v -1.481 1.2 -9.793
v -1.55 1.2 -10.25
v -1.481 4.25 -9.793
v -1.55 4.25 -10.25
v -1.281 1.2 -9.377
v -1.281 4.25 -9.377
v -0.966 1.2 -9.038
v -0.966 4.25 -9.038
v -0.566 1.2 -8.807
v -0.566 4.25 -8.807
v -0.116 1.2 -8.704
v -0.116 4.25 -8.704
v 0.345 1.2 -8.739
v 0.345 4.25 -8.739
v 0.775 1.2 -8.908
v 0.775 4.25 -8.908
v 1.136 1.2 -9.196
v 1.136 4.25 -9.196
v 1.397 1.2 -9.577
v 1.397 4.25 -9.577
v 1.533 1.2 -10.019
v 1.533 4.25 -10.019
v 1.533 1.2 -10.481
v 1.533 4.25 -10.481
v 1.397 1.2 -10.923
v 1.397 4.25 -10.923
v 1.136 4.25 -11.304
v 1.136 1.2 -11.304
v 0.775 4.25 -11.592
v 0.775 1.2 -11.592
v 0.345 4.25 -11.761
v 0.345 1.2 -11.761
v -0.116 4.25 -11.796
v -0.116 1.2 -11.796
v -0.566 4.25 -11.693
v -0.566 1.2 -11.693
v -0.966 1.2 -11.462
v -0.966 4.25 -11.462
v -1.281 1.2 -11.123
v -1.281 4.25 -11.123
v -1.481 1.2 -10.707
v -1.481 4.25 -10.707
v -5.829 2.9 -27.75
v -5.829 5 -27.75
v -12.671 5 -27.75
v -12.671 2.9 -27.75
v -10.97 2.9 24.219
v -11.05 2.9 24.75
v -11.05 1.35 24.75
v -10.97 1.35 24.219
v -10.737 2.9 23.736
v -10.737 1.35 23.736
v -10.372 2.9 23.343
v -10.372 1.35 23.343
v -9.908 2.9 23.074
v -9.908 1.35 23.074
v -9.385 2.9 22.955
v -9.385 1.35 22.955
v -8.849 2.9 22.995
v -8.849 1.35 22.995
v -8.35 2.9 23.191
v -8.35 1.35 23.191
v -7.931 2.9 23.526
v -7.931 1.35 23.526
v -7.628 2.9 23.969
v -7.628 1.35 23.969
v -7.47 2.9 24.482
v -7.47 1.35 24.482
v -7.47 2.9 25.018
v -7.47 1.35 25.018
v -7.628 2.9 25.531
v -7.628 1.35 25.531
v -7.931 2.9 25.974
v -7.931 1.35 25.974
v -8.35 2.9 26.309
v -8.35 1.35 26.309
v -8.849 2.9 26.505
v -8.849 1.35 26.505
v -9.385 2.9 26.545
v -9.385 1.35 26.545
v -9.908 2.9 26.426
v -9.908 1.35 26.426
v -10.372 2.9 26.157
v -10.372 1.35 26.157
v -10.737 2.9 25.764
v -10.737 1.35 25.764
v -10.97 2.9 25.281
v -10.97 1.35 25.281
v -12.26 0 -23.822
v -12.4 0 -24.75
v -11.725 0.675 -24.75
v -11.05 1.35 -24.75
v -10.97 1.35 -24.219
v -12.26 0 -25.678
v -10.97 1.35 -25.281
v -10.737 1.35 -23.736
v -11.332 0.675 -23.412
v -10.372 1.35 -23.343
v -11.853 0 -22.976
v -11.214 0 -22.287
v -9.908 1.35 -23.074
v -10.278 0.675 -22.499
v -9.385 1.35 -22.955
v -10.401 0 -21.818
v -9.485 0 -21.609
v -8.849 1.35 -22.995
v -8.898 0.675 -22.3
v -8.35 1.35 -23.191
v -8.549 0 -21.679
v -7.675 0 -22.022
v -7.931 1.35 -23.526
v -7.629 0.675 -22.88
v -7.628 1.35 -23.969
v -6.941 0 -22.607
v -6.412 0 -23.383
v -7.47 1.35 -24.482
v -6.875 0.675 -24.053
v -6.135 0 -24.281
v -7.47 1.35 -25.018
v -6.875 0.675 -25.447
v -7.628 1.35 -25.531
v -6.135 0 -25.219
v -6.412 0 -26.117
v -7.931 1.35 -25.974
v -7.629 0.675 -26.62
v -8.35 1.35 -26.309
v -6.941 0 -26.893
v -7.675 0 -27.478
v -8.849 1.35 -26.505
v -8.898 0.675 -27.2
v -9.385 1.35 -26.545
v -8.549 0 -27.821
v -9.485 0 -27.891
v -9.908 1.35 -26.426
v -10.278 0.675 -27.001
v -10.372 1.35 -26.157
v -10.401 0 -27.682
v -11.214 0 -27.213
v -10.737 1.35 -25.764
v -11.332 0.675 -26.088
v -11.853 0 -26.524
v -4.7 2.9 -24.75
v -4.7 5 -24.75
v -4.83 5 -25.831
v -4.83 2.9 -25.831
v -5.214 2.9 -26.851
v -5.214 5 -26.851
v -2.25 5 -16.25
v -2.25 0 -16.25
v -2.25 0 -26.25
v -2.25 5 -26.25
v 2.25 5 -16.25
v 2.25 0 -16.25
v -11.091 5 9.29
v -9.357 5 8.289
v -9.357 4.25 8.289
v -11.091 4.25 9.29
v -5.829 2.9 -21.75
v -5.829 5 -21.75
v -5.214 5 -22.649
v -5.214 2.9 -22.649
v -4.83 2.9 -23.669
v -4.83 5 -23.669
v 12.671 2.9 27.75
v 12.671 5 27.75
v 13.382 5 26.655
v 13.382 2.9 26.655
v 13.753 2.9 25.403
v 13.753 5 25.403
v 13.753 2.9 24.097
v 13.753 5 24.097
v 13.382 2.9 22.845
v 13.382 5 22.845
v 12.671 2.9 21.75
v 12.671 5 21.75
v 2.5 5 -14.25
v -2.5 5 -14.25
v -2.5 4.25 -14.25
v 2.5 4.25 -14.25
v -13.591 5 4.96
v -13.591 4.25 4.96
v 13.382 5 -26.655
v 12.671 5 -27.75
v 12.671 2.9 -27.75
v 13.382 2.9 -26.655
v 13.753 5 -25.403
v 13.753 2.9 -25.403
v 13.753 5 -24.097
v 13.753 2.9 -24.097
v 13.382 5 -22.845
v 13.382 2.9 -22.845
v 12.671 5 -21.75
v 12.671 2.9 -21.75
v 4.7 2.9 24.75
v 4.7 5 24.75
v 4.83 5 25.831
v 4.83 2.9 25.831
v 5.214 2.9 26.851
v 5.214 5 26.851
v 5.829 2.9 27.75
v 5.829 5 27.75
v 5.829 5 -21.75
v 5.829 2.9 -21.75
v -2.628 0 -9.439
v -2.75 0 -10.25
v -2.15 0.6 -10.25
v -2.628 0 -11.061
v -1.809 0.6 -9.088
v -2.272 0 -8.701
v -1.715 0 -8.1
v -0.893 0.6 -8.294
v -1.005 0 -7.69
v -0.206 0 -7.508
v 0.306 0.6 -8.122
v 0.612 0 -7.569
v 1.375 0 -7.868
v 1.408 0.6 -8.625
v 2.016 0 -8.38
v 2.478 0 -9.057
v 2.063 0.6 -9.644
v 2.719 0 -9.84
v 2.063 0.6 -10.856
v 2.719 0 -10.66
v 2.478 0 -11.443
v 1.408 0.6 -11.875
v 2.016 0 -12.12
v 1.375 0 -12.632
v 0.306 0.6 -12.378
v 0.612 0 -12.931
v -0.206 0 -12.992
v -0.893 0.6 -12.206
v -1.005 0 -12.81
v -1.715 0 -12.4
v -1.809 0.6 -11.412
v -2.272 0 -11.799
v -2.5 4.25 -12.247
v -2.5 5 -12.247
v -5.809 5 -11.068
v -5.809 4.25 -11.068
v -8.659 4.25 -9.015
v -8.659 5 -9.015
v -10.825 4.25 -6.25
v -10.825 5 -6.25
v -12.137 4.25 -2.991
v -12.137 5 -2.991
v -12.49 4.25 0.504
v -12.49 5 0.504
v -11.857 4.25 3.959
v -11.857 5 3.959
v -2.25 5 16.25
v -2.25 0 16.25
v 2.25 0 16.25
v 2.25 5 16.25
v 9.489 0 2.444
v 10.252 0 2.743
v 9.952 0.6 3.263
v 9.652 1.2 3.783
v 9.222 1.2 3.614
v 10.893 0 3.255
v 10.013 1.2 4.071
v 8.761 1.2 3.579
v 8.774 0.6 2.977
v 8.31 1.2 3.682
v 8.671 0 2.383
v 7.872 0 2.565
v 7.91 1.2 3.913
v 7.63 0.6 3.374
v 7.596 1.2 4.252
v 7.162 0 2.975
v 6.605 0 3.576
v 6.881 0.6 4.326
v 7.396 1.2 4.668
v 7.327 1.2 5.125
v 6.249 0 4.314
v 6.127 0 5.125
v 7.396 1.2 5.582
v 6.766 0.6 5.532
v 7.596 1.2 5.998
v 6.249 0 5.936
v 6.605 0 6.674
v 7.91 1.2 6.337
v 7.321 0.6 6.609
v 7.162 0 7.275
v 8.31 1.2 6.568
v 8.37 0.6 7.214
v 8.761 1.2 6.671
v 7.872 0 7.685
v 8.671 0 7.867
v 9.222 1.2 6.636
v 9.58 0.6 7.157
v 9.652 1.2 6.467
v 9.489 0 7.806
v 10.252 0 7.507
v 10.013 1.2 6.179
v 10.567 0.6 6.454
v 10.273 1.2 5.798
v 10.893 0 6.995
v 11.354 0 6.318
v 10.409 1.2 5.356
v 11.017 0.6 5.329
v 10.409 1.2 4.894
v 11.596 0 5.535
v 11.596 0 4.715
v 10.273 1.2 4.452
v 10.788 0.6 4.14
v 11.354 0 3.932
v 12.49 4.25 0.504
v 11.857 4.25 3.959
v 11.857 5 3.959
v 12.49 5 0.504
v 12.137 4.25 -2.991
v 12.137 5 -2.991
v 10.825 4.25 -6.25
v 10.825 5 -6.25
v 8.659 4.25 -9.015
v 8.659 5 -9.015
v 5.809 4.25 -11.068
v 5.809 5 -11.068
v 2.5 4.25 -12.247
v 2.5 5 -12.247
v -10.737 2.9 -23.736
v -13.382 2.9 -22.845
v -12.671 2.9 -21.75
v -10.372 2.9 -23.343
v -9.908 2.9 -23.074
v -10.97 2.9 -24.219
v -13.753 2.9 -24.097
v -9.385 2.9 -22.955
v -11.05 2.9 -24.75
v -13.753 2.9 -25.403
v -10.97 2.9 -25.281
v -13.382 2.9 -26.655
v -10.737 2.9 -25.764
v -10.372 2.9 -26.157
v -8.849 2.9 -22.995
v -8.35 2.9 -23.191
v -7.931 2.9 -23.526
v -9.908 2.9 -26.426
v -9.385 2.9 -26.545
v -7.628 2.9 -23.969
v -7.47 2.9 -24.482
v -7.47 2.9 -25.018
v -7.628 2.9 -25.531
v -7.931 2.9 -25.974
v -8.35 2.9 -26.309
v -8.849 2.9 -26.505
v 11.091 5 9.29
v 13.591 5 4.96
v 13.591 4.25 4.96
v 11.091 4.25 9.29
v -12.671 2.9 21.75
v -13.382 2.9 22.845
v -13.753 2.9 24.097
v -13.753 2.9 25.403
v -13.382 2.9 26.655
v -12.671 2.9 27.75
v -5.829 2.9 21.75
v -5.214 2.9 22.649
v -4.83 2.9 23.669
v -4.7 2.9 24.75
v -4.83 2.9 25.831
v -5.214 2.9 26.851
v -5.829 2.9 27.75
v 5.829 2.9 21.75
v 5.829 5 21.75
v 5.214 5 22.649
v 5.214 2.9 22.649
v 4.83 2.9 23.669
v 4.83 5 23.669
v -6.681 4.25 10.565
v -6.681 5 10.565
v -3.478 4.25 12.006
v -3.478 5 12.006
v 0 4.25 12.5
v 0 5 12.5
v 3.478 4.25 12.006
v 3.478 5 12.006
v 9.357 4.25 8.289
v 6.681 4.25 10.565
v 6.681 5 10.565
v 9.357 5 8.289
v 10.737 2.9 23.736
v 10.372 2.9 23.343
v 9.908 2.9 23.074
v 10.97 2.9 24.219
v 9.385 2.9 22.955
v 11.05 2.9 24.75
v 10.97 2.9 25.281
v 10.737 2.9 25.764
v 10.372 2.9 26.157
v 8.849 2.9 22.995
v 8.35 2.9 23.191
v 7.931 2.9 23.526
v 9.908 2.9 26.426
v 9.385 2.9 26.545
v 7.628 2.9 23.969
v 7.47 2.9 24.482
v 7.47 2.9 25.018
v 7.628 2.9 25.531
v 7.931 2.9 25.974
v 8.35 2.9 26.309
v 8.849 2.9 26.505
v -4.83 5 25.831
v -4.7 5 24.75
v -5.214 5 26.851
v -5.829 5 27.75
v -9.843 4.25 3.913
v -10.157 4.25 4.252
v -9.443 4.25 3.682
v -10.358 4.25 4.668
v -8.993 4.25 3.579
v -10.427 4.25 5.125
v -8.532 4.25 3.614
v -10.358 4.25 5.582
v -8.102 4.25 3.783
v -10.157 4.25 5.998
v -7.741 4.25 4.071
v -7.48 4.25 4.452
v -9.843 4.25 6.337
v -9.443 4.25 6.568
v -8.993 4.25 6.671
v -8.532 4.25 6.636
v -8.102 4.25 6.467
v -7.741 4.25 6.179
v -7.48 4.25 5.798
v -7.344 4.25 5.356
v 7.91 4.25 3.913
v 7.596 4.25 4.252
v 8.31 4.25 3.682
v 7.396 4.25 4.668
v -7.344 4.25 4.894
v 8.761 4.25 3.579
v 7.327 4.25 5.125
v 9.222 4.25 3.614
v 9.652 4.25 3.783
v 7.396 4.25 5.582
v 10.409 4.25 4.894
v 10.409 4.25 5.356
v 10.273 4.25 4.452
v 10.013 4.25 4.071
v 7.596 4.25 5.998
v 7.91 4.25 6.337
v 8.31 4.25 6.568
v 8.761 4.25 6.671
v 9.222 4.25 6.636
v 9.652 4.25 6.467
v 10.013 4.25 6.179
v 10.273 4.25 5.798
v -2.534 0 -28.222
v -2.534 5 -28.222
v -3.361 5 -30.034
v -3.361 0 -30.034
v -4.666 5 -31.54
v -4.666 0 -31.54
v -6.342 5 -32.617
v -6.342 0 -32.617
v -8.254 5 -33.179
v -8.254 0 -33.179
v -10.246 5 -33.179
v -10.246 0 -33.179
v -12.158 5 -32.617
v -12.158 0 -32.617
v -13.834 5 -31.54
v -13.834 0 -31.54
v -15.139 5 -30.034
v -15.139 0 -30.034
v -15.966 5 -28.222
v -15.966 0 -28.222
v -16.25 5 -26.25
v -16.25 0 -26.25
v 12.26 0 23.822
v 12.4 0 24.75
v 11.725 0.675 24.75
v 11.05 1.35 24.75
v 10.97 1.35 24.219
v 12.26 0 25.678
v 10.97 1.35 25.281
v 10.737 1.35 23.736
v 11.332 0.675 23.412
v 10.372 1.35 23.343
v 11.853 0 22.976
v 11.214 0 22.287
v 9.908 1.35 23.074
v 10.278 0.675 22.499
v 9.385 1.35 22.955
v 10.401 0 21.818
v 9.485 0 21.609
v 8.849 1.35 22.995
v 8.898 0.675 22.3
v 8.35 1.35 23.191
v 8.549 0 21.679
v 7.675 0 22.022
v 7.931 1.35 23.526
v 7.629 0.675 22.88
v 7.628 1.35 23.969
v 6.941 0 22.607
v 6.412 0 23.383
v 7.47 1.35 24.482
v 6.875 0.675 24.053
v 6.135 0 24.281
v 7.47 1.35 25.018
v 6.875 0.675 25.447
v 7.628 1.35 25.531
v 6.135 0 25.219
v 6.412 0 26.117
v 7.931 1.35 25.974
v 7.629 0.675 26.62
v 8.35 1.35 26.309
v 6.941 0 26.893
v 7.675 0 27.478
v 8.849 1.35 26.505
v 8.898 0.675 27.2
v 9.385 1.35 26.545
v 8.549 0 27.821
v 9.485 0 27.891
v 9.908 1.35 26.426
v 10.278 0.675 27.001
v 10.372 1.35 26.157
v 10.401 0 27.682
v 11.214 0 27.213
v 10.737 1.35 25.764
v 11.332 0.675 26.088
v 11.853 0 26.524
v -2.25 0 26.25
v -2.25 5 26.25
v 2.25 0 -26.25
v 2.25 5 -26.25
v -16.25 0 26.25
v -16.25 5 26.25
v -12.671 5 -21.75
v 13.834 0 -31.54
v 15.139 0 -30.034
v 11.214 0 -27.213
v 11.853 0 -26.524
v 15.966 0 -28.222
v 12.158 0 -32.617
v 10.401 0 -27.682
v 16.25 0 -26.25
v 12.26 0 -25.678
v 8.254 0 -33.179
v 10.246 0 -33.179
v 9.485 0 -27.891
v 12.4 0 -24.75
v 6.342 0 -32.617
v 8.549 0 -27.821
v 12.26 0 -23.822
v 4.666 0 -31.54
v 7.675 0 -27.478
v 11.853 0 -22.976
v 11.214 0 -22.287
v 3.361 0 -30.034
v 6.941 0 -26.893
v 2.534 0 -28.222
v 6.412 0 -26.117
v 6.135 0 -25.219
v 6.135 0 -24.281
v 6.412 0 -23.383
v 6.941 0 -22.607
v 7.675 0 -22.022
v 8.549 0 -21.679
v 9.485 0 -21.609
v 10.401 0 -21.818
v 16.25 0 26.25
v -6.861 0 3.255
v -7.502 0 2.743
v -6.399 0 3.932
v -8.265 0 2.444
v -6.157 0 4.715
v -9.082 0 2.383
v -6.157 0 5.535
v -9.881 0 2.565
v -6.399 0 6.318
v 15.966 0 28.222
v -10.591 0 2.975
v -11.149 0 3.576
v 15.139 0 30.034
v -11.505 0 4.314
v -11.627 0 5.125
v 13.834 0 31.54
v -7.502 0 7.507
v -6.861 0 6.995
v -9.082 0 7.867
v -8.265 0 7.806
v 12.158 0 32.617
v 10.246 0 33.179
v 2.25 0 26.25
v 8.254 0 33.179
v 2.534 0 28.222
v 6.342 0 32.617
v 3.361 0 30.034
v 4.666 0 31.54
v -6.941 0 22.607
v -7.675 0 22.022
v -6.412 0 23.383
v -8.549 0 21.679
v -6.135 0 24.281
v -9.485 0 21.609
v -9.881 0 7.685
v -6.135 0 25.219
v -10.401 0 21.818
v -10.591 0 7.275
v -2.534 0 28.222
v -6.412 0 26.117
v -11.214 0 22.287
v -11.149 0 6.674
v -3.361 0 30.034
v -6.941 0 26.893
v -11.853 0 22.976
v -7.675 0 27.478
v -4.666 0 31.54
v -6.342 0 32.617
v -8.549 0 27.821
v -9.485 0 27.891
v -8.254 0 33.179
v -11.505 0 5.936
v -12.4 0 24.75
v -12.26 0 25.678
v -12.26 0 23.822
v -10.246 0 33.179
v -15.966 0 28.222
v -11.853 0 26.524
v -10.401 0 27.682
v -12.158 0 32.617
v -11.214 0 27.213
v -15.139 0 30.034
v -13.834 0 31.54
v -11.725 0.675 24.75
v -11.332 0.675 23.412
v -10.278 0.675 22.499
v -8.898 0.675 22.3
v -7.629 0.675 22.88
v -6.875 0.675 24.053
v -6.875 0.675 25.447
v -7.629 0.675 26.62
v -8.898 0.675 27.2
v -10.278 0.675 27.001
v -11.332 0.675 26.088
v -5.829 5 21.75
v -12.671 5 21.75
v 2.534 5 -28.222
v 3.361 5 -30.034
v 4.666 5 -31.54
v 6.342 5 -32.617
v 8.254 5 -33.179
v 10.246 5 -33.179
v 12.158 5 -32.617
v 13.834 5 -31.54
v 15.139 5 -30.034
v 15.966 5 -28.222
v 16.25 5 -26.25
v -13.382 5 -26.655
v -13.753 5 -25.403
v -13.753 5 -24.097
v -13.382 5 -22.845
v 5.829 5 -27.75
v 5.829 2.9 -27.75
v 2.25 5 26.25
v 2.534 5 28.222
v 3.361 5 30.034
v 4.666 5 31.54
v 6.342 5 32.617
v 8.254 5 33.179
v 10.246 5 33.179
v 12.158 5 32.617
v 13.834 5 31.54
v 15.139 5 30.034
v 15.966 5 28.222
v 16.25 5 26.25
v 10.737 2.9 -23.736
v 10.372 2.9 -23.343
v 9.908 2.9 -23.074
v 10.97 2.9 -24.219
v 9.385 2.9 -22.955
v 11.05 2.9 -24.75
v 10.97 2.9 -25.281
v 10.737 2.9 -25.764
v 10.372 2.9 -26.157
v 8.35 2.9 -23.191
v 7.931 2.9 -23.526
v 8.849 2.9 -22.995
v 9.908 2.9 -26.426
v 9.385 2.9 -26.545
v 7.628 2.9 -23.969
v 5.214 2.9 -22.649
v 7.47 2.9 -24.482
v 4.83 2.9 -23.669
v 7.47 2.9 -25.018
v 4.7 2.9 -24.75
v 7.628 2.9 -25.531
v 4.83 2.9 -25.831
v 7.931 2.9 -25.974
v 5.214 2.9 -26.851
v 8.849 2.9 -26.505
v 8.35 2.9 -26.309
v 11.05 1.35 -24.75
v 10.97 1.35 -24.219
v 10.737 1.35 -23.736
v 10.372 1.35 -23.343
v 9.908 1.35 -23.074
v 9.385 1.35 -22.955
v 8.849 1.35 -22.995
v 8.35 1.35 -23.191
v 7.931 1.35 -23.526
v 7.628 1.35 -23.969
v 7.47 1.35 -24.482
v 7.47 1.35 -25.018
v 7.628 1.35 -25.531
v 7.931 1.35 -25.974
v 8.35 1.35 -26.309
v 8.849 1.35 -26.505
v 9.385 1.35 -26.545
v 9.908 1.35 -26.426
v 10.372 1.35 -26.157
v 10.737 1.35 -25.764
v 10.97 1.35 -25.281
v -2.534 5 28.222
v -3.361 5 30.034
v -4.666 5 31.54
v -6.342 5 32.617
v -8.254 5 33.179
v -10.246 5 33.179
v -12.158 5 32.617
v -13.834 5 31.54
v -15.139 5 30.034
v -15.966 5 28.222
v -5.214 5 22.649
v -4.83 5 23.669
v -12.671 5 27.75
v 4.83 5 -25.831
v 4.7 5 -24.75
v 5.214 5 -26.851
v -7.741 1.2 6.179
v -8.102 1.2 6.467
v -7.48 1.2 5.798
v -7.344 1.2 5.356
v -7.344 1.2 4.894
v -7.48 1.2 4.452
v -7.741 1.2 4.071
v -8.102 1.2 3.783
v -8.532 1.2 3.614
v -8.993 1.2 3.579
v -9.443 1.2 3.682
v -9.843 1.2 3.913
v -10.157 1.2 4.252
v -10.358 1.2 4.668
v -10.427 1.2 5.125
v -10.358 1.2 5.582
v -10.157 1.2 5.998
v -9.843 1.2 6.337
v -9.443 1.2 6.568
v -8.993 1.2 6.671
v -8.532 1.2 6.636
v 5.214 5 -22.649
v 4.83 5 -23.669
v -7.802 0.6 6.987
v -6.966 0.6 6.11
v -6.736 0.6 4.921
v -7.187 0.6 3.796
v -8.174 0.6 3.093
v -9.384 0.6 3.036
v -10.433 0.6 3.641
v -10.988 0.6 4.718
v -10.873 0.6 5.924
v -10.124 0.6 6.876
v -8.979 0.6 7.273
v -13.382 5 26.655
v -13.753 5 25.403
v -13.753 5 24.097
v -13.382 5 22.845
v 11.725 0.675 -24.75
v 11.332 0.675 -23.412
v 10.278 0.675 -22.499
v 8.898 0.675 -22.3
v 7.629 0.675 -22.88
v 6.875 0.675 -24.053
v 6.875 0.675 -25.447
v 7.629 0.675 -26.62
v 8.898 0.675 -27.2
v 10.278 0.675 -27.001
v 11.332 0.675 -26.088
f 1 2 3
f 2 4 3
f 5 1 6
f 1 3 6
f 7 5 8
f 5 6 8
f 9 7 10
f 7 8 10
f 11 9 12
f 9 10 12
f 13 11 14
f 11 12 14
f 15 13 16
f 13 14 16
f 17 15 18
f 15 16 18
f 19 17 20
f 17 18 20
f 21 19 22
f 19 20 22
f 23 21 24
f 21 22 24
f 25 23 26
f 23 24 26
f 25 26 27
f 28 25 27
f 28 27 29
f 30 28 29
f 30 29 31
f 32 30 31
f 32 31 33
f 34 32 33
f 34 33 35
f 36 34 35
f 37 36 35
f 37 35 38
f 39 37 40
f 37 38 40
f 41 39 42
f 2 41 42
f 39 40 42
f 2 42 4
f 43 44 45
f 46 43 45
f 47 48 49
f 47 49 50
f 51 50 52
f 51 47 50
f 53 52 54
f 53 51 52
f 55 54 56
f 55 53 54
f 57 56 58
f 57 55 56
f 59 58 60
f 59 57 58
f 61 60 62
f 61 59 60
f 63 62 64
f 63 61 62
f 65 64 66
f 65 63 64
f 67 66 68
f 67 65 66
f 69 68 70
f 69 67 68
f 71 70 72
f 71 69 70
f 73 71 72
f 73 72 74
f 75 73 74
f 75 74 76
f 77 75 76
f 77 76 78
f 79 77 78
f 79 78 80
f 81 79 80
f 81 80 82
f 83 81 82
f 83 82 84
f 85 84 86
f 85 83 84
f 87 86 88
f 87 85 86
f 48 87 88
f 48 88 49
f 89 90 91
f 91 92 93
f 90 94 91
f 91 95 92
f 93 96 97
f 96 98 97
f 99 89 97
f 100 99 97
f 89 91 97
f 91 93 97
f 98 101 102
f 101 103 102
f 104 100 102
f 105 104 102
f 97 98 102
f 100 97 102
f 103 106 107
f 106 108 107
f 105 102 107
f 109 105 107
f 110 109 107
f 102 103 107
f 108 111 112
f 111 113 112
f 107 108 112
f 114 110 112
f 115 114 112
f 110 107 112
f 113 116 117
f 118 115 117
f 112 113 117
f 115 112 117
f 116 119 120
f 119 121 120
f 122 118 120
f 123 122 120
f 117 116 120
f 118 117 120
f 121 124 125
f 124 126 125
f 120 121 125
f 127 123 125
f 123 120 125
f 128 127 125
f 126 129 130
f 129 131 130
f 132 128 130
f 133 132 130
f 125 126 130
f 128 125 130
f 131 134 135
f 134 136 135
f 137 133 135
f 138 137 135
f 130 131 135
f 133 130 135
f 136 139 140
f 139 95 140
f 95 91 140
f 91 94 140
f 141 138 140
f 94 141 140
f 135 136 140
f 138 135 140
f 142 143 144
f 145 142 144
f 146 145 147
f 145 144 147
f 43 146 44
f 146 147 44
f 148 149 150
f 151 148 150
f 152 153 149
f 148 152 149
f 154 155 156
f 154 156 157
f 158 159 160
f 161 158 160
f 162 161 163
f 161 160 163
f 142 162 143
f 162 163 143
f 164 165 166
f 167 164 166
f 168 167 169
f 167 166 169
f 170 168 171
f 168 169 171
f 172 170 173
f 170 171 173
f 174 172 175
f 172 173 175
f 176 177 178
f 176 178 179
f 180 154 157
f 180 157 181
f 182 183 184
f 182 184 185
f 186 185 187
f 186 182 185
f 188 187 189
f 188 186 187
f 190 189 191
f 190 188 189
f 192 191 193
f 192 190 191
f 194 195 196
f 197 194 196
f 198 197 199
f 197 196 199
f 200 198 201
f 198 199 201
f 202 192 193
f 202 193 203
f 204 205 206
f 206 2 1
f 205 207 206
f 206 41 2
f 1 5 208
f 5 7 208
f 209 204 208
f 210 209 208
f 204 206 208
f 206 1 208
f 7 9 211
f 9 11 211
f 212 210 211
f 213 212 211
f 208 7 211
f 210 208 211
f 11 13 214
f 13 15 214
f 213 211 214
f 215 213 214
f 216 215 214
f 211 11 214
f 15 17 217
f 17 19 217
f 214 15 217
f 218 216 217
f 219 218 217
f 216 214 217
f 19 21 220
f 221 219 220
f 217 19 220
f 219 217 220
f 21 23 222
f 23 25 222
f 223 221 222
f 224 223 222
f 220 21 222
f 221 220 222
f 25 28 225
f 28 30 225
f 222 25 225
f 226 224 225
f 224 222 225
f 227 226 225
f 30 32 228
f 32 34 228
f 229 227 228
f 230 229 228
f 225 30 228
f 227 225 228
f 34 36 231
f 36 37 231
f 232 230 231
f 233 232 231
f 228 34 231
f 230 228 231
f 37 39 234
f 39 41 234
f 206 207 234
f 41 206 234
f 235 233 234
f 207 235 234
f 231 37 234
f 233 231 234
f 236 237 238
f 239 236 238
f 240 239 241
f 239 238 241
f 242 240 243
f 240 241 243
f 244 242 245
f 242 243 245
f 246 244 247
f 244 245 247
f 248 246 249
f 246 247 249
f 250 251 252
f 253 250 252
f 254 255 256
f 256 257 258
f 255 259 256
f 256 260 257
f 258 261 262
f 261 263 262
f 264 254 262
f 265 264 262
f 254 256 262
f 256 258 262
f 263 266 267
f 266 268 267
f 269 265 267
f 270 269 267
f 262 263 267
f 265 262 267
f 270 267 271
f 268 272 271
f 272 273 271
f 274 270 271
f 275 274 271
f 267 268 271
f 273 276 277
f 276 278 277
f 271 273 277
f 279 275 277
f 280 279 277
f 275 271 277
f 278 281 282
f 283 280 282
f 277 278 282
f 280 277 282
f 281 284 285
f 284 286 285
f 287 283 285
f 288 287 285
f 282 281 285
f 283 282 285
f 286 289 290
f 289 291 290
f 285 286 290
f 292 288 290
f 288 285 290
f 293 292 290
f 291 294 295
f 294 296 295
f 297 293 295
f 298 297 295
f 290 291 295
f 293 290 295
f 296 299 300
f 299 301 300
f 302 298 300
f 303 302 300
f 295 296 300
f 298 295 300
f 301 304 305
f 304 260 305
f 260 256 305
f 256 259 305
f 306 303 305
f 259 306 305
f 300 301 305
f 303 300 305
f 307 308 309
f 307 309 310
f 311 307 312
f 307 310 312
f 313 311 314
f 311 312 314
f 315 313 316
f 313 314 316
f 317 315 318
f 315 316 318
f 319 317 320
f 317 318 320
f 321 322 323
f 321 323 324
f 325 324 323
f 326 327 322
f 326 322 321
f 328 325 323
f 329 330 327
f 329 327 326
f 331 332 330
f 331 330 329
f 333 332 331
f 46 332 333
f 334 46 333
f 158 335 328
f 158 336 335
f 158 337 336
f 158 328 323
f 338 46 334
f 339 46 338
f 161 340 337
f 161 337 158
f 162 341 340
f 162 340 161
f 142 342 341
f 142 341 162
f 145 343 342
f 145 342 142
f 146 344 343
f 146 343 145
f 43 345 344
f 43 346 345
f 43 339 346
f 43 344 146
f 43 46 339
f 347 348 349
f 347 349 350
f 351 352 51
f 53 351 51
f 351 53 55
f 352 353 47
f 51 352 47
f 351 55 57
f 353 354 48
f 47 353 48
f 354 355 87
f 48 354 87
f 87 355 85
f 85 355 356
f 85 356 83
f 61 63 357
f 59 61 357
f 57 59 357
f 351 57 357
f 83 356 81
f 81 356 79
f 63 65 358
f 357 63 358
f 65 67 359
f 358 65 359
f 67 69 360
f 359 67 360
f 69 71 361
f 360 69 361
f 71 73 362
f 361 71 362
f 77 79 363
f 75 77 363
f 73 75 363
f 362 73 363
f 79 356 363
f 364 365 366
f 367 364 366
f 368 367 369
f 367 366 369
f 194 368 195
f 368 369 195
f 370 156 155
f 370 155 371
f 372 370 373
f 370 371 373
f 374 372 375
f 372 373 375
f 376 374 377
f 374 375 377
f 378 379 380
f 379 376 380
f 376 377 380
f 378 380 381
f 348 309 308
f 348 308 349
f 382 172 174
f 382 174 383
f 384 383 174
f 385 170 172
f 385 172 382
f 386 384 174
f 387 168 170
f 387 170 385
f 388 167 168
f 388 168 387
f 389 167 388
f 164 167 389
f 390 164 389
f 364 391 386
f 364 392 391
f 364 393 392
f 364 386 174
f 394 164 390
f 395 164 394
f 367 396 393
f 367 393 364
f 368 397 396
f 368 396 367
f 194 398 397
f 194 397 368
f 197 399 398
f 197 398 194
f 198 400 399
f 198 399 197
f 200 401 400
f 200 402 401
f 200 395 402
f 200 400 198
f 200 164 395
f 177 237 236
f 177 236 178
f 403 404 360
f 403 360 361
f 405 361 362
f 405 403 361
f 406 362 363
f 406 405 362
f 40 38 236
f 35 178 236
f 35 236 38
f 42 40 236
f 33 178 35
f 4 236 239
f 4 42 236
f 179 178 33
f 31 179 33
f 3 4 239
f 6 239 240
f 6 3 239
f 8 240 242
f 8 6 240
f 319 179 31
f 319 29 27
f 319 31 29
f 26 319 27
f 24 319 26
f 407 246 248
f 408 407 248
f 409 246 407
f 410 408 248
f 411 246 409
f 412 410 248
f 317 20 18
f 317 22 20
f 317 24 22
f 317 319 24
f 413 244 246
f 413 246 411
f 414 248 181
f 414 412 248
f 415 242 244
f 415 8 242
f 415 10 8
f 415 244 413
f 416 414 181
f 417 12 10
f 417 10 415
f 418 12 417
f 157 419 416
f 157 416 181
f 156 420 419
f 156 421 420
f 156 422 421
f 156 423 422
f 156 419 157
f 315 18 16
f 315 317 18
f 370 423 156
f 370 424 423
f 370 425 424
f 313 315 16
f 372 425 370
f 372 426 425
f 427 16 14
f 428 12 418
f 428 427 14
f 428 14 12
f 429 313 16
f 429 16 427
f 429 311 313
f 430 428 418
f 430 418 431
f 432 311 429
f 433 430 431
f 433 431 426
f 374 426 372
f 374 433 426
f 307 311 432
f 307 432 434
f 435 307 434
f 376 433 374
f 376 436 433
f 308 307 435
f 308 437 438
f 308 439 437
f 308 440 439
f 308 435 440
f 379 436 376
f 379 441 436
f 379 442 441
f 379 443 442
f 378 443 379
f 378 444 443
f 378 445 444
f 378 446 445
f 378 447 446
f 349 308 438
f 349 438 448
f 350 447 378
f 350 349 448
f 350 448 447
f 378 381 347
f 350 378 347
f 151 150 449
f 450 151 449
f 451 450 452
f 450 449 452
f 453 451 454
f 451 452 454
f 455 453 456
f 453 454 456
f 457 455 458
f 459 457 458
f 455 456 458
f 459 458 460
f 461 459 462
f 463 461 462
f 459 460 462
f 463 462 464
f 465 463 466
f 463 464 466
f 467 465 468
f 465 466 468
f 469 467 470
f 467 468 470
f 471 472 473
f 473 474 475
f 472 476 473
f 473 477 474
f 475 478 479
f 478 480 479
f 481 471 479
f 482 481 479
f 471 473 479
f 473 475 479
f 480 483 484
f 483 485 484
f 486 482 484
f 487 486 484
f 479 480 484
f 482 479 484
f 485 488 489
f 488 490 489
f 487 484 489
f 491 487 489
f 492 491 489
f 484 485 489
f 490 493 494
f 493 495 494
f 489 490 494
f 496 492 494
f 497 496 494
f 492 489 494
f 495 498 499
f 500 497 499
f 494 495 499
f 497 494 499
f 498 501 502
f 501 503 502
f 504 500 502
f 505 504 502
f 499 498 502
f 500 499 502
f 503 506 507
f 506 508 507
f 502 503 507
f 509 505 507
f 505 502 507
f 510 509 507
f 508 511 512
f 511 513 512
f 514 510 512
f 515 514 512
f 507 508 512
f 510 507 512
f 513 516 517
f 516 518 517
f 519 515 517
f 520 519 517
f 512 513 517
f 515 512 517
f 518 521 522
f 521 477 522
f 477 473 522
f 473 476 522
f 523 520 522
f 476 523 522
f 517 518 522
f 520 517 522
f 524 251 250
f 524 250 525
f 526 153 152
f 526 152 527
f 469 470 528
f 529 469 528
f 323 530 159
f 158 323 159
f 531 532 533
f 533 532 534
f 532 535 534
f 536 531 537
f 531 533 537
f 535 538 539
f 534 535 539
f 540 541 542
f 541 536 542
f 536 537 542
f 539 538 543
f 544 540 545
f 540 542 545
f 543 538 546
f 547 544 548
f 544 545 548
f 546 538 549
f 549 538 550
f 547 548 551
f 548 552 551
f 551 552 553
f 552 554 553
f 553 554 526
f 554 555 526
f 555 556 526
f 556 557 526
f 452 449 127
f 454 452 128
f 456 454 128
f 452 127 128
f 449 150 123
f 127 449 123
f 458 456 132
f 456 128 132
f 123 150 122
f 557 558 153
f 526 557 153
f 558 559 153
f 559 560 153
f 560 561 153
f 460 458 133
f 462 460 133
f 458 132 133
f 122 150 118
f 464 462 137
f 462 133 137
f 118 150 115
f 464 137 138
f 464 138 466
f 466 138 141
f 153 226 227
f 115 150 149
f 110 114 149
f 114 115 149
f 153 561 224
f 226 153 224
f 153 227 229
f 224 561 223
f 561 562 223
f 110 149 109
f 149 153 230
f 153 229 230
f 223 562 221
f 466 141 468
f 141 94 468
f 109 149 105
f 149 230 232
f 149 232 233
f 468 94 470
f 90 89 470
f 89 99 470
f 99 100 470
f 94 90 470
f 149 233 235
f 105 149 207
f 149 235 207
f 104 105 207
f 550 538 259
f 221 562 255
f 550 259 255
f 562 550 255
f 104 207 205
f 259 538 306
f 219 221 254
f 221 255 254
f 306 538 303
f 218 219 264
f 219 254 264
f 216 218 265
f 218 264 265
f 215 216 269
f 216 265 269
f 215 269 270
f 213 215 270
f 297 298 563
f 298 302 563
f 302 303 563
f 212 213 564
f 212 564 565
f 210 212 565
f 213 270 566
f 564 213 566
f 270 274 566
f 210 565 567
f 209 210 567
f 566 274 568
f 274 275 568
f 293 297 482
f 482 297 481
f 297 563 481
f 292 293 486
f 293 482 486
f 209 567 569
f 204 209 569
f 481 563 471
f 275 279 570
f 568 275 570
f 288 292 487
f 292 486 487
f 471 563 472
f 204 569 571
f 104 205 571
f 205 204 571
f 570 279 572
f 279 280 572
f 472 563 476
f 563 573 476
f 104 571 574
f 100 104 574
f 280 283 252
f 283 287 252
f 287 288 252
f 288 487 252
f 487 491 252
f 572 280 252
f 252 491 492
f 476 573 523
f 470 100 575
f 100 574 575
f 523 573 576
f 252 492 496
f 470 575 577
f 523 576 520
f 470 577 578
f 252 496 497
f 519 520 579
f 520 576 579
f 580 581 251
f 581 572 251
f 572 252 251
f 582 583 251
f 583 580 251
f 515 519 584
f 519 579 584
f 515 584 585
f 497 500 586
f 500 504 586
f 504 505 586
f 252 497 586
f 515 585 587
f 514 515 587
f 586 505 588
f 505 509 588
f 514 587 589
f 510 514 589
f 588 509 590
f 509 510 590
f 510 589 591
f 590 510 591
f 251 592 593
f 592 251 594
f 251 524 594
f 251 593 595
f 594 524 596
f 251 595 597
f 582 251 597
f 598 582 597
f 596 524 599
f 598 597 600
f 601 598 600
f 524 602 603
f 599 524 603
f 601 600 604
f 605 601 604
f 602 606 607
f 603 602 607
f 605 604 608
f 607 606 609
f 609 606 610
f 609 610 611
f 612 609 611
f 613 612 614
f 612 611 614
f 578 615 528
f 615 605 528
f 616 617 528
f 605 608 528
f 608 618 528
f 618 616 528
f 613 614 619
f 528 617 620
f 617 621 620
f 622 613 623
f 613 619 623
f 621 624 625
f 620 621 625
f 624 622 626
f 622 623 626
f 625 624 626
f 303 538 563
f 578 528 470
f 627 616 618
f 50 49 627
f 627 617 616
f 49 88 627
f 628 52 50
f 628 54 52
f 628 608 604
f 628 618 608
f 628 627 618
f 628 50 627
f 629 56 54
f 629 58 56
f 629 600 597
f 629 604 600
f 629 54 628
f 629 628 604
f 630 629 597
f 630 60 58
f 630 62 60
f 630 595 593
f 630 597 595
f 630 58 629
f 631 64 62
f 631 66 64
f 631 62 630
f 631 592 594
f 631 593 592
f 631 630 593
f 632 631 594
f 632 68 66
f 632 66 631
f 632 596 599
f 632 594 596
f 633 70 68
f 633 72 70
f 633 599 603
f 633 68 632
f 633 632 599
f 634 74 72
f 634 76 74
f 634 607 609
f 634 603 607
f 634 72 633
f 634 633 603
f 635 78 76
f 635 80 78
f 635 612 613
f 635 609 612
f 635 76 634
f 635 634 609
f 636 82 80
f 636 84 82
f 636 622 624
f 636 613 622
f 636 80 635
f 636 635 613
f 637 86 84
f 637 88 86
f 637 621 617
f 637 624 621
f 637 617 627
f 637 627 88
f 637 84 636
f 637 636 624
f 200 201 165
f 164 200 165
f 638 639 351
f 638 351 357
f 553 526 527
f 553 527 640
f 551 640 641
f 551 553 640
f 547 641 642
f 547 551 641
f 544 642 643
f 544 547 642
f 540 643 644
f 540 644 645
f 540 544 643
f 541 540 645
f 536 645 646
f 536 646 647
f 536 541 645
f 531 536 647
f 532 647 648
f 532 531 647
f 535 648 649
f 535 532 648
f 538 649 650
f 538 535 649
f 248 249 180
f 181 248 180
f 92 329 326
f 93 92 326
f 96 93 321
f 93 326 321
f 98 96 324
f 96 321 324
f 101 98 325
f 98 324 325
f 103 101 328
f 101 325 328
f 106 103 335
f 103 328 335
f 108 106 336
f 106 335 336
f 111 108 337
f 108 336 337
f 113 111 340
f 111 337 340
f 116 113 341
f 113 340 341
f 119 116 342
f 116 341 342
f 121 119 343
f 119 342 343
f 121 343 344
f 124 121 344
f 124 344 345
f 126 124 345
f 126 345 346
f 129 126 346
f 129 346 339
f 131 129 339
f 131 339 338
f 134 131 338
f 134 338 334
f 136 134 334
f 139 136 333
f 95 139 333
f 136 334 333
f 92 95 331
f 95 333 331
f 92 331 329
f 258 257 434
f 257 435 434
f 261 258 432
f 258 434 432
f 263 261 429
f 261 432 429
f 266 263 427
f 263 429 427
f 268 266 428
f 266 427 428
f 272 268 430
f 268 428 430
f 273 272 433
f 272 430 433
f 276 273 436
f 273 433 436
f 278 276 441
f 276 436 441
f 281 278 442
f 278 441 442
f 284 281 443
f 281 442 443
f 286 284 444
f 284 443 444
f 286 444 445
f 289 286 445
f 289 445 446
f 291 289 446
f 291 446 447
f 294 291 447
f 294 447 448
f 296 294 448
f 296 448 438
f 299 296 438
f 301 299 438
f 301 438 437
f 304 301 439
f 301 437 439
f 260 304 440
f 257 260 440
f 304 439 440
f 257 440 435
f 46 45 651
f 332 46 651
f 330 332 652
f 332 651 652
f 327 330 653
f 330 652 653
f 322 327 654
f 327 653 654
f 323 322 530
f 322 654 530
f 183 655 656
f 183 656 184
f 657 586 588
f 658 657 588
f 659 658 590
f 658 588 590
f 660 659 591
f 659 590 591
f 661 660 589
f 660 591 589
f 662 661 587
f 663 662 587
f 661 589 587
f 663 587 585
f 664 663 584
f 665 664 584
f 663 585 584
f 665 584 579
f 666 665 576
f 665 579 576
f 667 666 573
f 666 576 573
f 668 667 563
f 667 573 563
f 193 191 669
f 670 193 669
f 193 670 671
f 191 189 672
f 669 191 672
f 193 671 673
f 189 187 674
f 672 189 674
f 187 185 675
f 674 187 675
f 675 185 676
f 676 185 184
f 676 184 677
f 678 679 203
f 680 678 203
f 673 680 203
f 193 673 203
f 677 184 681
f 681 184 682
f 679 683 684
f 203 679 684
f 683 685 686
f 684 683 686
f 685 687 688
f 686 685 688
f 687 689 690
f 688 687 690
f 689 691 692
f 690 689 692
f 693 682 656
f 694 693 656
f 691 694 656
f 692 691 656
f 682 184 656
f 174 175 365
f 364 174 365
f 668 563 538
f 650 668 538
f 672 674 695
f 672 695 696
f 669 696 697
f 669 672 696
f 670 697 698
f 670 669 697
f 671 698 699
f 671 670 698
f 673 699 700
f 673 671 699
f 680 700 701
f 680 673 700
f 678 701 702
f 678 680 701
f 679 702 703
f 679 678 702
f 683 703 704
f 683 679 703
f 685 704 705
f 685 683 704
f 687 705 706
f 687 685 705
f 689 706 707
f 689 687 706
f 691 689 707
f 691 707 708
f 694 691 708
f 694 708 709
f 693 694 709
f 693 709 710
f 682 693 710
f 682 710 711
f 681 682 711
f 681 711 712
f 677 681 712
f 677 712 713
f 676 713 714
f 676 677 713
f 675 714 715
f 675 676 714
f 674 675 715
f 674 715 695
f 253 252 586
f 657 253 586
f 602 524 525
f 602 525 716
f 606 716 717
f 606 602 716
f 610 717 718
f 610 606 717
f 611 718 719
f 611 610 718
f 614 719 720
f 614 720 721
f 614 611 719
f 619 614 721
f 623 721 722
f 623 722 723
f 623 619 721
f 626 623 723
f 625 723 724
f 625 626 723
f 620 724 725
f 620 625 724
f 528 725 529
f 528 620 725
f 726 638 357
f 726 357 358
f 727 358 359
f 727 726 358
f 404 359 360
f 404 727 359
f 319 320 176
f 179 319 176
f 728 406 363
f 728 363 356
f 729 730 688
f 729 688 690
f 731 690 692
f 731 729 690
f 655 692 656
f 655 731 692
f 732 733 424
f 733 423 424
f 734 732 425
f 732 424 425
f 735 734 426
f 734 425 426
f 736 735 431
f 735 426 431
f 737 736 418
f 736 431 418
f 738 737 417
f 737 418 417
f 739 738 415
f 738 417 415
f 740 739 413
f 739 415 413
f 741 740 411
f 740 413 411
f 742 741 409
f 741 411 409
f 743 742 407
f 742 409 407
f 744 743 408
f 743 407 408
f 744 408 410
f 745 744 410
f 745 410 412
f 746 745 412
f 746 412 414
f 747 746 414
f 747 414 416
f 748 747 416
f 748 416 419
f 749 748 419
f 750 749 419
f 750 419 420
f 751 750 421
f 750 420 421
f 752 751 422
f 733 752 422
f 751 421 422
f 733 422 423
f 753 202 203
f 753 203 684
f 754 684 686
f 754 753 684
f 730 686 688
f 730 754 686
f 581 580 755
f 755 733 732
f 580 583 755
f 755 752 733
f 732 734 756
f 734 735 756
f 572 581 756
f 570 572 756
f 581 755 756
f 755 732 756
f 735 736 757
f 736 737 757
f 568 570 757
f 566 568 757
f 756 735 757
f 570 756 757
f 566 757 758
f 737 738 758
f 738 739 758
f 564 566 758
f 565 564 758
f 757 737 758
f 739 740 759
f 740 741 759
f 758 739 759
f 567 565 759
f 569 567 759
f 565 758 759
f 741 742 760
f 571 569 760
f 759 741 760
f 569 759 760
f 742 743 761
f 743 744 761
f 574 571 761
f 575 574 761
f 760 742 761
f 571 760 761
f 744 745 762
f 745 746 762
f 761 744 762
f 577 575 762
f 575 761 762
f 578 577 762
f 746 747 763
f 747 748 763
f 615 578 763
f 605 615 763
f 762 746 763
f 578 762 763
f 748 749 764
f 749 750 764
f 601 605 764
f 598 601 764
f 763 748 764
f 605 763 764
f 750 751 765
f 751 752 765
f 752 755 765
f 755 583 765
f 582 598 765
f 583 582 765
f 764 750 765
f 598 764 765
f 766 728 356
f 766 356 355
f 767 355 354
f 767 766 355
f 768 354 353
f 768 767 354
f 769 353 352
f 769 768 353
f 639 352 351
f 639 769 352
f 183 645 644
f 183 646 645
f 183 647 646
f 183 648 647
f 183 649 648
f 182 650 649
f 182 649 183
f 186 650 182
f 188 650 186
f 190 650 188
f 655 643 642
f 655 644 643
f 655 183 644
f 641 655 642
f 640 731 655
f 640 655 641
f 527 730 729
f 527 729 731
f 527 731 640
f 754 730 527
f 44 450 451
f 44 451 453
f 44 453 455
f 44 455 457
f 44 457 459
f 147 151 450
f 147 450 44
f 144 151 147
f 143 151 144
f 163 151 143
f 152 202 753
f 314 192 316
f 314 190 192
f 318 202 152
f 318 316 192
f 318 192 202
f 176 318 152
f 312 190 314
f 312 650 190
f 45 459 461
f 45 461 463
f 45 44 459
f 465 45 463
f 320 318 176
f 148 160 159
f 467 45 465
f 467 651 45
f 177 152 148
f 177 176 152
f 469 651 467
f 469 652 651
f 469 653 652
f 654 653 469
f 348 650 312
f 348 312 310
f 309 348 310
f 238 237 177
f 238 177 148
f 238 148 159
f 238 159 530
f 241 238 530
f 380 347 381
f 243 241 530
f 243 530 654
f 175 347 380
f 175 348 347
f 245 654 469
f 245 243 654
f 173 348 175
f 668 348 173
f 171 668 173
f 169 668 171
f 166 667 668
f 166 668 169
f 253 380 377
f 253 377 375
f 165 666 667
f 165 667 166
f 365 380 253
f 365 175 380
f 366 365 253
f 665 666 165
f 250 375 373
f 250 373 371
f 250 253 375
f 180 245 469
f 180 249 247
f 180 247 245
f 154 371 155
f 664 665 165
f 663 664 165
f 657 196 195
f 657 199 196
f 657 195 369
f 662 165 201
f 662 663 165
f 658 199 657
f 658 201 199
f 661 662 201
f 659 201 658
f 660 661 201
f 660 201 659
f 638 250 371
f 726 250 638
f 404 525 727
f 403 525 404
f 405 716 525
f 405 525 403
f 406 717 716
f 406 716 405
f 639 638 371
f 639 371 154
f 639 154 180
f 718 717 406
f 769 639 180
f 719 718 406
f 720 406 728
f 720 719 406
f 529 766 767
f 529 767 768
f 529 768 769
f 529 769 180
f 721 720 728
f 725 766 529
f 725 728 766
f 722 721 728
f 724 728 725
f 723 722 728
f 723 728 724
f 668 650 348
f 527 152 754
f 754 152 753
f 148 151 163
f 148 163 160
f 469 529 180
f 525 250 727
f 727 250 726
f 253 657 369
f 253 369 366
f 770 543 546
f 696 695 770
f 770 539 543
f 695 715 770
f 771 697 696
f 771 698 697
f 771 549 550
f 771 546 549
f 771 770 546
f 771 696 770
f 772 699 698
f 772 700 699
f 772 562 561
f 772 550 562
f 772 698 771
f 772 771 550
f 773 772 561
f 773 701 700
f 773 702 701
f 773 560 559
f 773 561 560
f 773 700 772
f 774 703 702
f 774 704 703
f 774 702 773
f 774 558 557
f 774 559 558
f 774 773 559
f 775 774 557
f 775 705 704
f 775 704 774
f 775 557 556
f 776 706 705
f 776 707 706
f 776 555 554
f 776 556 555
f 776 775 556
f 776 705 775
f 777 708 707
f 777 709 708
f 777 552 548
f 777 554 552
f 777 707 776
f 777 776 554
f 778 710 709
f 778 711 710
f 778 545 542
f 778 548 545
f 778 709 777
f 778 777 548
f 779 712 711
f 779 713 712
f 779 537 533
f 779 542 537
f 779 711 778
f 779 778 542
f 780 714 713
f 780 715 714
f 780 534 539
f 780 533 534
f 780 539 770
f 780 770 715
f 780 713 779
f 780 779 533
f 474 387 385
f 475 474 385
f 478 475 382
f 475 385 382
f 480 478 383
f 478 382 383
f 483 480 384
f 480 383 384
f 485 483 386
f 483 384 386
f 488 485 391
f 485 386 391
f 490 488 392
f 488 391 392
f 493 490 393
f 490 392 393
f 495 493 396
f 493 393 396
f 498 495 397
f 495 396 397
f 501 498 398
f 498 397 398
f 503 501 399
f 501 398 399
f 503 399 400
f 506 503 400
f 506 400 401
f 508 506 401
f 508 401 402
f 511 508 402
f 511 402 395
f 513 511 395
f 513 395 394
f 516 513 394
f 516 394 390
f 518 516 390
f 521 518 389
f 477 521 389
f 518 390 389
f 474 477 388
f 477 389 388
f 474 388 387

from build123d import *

# Parameters (mm, degrees)
BOSS_EXTRUDE1_DEPTH                               = 5
CSK_FOR_M3_FLAT_HEAD_MACHINE_SCREW1_D             = 3.6
CSK_FOR_M3_FLAT_HEAD_MACHINE_SCREW1_CSINK_D       = 6.3
CSK_FOR_M3_FLAT_HEAD_MACHINE_SCREW1_CSINK_ANGLE   = 90
SKETCH16_R                                        = 1.8
CUT_EXTRUDE7_DEPTH                                = 2.1
MIRROR6_COPY_1_DEPTH                              = 5
MIRROR6_COPY_2_D                                  = 3.6
MIRROR6_COPY_2_CSINK_D                            = 6.3
MIRROR6_COPY_2_CSINK_ANGLE                        = 90
MIRROR6_COPY_3_SKETCH_R                           = 1.8
MIRROR6_COPY_3_DEPTH                              = 2.1
SKETCH6_R                                         = 12.5
CUT_EXTRUDE2_DEPTH                                = 0.75
SKETCH6_4_R                                       = 12.5
SKETCH6_4_W                                       = 5
SKETCH6_4_H                                       = 3.5
CUT_EXTRUDE5_DEPTH                                = 0.75
CSK_FOR_M2_5_FLAT_HEAD_MACHINE_SCREW3_D           = 3.1
CSK_FOR_M2_5_FLAT_HEAD_MACHINE_SCREW3_CSINK_D     = 5.5
CSK_FOR_M2_5_FLAT_HEAD_MACHINE_SCREW3_CSINK_ANGLE = 90
CIRPATTERN1_COUNT                                 = 3


with BuildPart() as part:
    # Sketch1 → Boss-Extrude1 (new body)
    with BuildSketch(Plane(origin=(0, 0, 0), x_dir=(1, 0, 0), z_dir=(0, 1, 0))):
        with BuildLine():
            Line((-16.25, 26.25), (-16.25, 16.25))
            Line((-16.25, 16.25), (-2.25, 16.25))
            Line((-2.25, 16.25), (-2.25, 26.25))
            ThreePointArc((-2.25, 26.25), (-9.25, 33.25), (-16.25, 26.25))
        make_face()
        Polygon((-2.25, 16.25), (-16.25, 16.25), (-16.25, -16.25), (16.25, -16.25), (16.25, 16.25), align=None)
    boss_extrude1 = extrude(amount=BOSS_EXTRUDE1_DEPTH)

    # CSK for M3 Flat Head Machine Screw1 (through all)
    with Locations(Plane.XZ):
        with Locations((-9.25, -24.75)):
            csk_for_m3_flat_head_machine_screw1 = CounterSinkHole(CSK_FOR_M3_FLAT_HEAD_MACHINE_SCREW1_D / 2, CSK_FOR_M3_FLAT_HEAD_MACHINE_SCREW1_CSINK_D / 2, counter_sink_angle=CSK_FOR_M3_FLAT_HEAD_MACHINE_SCREW1_CSINK_ANGLE)

    # Sketch16 → Cut-Extrude7 (cut)
    with BuildSketch(Plane(origin=(0, 5, 0), x_dir=(1, 0, 0), z_dir=(0, 1, 0))):
        with BuildLine():
            Line((-5.829108303, 27.75), (-12.670891697, 27.75))
            ThreePointArc((-12.670891697, 27.75), (-13.8, 24.75), (-12.670891697, 21.75))
            Line((-12.670891697, 21.75), (-5.829108303, 21.75))
            ThreePointArc((-5.829108303, 21.75), (-4.991622538, 23.147276883), (-4.7, 24.75))
            ThreePointArc((-4.7, 24.75), (-4.991622538, 26.352723117), (-5.829108303, 27.75))
        make_face()
        with Locations(Location((-9.25, 24.75, 0), (0, 0, 90))):
            Circle(SKETCH16_R, mode=Mode.SUBTRACT)
    cut_extrude7 = extrude(amount=-CUT_EXTRUDE7_DEPTH, mode=Mode.SUBTRACT)

    # Mirror2: Boss-Extrude1, CSK for M3 Flat Head Machine Screw1, Cut-Extrude7 across plane
    add(boss_extrude1.mirror(Plane(origin=(0, 0, 0), x_dir=(0, 0, 1), z_dir=(1, 0, 0))))
    add(csk_for_m3_flat_head_machine_screw1.mirror(Plane(origin=(0, 0, 0), x_dir=(0, 0, 1), z_dir=(1, 0, 0))), mode=Mode.SUBTRACT)
    add(cut_extrude7.mirror(Plane(origin=(0, 0, 0), x_dir=(0, 0, 1), z_dir=(1, 0, 0))), mode=Mode.SUBTRACT)

    # Mirror6: Boss-Extrude1, CSK for M3 Flat Head Machine Screw1, Cut-Extrude7 across plane
    add(boss_extrude1.mirror(Plane.XY))
    add(csk_for_m3_flat_head_machine_screw1.mirror(Plane.XY), mode=Mode.SUBTRACT)
    add(cut_extrude7.mirror(Plane.XY), mode=Mode.SUBTRACT)

    # Mirror6 copy 1 sketch → Mirror6 copy 1 (add)
    with BuildSketch(Plane(origin=(0, 0, 0), x_dir=(-1, 0, 0), z_dir=(0, 1, 0))):
        with BuildLine():
            Line((-16.25, 26.25), (-16.25, 16.25))
            Line((-16.25, 16.25), (-2.25, 16.25))
            Line((-2.25, 16.25), (-2.25, 26.25))
            ThreePointArc((-2.25, 26.25), (-9.25, 33.25), (-16.25, 26.25))
        make_face()
        Polygon((-2.25, 16.25), (-16.25, 16.25), (-16.25, -16.25), (16.25, -16.25), (16.25, 16.25), align=None)
    extrude(amount=MIRROR6_COPY_1_DEPTH)

    # Mirror6 copy 2 (through all)
    with Locations(Plane(origin=(0, 0, 0), x_dir=(-1, 0, 0), z_dir=(0, -1, 0))):
        with Locations((-9.25, -24.75)):
            CounterSinkHole(MIRROR6_COPY_2_D / 2, MIRROR6_COPY_2_CSINK_D / 2, counter_sink_angle=MIRROR6_COPY_2_CSINK_ANGLE)

    # Mirror6 copy 3 sketch → Mirror6 copy 3 (cut)
    with BuildSketch(Plane(origin=(0, 5, 0), x_dir=(-1, 0, 0), z_dir=(0, 1, 0))):
        with BuildLine():
            Line((-5.829108303, 27.75), (-12.670891697, 27.75))
            ThreePointArc((-12.670891697, 27.75), (-13.8, 24.75), (-12.670891697, 21.75))
            Line((-12.670891697, 21.75), (-5.829108303, 21.75))
            ThreePointArc((-5.829108303, 21.75), (-4.991622538, 23.147276883), (-4.7, 24.75))
            ThreePointArc((-4.7, 24.75), (-4.991622538, 26.352723117), (-5.829108303, 27.75))
        make_face()
        with Locations(Location((-9.25, 24.75, 0), (0, 0, 90))):
            Circle(MIRROR6_COPY_3_SKETCH_R, mode=Mode.SUBTRACT)
    extrude(amount=-MIRROR6_COPY_3_DEPTH, mode=Mode.SUBTRACT)

    # Sketch6 → Cut-Extrude2 (cut)
    with BuildSketch(Plane(origin=(0, 5, 0), x_dir=(1, 0, 0), z_dir=(0, 1, 0))):
        with Locations(Location((0, 0, 0), (0, 0, 270))):
            Circle(SKETCH6_R)
    extrude(amount=-CUT_EXTRUDE2_DEPTH, mode=Mode.SUBTRACT)

    # Sketch6<4> → Cut-Extrude5 (cut)
    with BuildSketch(Plane(origin=(0, 5, 0), x_dir=(1, 0, 0), z_dir=(0, 1, 0))):
        Circle(SKETCH6_4_R)
        with Locations((0, 12.5)):
            Rectangle(SKETCH6_4_W, SKETCH6_4_H)
    cut_extrude5 = extrude(amount=-CUT_EXTRUDE5_DEPTH, mode=Mode.SUBTRACT)

    # CSK for M2.5 Flat Head Machine Screw3 (through all)
    with Locations(Plane.XZ):
        with Locations((0, -10.25)):
            csk_for_m2_5_flat_head_machine_screw3 = CounterSinkHole(CSK_FOR_M2_5_FLAT_HEAD_MACHINE_SCREW3_D / 2, CSK_FOR_M2_5_FLAT_HEAD_MACHINE_SCREW3_CSINK_D / 2, counter_sink_angle=CSK_FOR_M2_5_FLAT_HEAD_MACHINE_SCREW3_CSINK_ANGLE)

    # CirPattern1: Cut-Extrude5, CSK for M2.5 Flat Head Machine Screw3 ×3 about axis
    cirpattern1_axis = Axis((0, 0, 0), (0, 1, 0))
    add([cut_extrude5.rotate(cirpattern1_axis, i * 360 / CIRPATTERN1_COUNT) for i in range(1, CIRPATTERN1_COUNT)], mode=Mode.SUBTRACT)
    add([csk_for_m2_5_flat_head_machine_screw3.rotate(cirpattern1_axis, i * 360 / CIRPATTERN1_COUNT) for i in range(1, CIRPATTERN1_COUNT)], mode=Mode.SUBTRACT)


solid = part.part
